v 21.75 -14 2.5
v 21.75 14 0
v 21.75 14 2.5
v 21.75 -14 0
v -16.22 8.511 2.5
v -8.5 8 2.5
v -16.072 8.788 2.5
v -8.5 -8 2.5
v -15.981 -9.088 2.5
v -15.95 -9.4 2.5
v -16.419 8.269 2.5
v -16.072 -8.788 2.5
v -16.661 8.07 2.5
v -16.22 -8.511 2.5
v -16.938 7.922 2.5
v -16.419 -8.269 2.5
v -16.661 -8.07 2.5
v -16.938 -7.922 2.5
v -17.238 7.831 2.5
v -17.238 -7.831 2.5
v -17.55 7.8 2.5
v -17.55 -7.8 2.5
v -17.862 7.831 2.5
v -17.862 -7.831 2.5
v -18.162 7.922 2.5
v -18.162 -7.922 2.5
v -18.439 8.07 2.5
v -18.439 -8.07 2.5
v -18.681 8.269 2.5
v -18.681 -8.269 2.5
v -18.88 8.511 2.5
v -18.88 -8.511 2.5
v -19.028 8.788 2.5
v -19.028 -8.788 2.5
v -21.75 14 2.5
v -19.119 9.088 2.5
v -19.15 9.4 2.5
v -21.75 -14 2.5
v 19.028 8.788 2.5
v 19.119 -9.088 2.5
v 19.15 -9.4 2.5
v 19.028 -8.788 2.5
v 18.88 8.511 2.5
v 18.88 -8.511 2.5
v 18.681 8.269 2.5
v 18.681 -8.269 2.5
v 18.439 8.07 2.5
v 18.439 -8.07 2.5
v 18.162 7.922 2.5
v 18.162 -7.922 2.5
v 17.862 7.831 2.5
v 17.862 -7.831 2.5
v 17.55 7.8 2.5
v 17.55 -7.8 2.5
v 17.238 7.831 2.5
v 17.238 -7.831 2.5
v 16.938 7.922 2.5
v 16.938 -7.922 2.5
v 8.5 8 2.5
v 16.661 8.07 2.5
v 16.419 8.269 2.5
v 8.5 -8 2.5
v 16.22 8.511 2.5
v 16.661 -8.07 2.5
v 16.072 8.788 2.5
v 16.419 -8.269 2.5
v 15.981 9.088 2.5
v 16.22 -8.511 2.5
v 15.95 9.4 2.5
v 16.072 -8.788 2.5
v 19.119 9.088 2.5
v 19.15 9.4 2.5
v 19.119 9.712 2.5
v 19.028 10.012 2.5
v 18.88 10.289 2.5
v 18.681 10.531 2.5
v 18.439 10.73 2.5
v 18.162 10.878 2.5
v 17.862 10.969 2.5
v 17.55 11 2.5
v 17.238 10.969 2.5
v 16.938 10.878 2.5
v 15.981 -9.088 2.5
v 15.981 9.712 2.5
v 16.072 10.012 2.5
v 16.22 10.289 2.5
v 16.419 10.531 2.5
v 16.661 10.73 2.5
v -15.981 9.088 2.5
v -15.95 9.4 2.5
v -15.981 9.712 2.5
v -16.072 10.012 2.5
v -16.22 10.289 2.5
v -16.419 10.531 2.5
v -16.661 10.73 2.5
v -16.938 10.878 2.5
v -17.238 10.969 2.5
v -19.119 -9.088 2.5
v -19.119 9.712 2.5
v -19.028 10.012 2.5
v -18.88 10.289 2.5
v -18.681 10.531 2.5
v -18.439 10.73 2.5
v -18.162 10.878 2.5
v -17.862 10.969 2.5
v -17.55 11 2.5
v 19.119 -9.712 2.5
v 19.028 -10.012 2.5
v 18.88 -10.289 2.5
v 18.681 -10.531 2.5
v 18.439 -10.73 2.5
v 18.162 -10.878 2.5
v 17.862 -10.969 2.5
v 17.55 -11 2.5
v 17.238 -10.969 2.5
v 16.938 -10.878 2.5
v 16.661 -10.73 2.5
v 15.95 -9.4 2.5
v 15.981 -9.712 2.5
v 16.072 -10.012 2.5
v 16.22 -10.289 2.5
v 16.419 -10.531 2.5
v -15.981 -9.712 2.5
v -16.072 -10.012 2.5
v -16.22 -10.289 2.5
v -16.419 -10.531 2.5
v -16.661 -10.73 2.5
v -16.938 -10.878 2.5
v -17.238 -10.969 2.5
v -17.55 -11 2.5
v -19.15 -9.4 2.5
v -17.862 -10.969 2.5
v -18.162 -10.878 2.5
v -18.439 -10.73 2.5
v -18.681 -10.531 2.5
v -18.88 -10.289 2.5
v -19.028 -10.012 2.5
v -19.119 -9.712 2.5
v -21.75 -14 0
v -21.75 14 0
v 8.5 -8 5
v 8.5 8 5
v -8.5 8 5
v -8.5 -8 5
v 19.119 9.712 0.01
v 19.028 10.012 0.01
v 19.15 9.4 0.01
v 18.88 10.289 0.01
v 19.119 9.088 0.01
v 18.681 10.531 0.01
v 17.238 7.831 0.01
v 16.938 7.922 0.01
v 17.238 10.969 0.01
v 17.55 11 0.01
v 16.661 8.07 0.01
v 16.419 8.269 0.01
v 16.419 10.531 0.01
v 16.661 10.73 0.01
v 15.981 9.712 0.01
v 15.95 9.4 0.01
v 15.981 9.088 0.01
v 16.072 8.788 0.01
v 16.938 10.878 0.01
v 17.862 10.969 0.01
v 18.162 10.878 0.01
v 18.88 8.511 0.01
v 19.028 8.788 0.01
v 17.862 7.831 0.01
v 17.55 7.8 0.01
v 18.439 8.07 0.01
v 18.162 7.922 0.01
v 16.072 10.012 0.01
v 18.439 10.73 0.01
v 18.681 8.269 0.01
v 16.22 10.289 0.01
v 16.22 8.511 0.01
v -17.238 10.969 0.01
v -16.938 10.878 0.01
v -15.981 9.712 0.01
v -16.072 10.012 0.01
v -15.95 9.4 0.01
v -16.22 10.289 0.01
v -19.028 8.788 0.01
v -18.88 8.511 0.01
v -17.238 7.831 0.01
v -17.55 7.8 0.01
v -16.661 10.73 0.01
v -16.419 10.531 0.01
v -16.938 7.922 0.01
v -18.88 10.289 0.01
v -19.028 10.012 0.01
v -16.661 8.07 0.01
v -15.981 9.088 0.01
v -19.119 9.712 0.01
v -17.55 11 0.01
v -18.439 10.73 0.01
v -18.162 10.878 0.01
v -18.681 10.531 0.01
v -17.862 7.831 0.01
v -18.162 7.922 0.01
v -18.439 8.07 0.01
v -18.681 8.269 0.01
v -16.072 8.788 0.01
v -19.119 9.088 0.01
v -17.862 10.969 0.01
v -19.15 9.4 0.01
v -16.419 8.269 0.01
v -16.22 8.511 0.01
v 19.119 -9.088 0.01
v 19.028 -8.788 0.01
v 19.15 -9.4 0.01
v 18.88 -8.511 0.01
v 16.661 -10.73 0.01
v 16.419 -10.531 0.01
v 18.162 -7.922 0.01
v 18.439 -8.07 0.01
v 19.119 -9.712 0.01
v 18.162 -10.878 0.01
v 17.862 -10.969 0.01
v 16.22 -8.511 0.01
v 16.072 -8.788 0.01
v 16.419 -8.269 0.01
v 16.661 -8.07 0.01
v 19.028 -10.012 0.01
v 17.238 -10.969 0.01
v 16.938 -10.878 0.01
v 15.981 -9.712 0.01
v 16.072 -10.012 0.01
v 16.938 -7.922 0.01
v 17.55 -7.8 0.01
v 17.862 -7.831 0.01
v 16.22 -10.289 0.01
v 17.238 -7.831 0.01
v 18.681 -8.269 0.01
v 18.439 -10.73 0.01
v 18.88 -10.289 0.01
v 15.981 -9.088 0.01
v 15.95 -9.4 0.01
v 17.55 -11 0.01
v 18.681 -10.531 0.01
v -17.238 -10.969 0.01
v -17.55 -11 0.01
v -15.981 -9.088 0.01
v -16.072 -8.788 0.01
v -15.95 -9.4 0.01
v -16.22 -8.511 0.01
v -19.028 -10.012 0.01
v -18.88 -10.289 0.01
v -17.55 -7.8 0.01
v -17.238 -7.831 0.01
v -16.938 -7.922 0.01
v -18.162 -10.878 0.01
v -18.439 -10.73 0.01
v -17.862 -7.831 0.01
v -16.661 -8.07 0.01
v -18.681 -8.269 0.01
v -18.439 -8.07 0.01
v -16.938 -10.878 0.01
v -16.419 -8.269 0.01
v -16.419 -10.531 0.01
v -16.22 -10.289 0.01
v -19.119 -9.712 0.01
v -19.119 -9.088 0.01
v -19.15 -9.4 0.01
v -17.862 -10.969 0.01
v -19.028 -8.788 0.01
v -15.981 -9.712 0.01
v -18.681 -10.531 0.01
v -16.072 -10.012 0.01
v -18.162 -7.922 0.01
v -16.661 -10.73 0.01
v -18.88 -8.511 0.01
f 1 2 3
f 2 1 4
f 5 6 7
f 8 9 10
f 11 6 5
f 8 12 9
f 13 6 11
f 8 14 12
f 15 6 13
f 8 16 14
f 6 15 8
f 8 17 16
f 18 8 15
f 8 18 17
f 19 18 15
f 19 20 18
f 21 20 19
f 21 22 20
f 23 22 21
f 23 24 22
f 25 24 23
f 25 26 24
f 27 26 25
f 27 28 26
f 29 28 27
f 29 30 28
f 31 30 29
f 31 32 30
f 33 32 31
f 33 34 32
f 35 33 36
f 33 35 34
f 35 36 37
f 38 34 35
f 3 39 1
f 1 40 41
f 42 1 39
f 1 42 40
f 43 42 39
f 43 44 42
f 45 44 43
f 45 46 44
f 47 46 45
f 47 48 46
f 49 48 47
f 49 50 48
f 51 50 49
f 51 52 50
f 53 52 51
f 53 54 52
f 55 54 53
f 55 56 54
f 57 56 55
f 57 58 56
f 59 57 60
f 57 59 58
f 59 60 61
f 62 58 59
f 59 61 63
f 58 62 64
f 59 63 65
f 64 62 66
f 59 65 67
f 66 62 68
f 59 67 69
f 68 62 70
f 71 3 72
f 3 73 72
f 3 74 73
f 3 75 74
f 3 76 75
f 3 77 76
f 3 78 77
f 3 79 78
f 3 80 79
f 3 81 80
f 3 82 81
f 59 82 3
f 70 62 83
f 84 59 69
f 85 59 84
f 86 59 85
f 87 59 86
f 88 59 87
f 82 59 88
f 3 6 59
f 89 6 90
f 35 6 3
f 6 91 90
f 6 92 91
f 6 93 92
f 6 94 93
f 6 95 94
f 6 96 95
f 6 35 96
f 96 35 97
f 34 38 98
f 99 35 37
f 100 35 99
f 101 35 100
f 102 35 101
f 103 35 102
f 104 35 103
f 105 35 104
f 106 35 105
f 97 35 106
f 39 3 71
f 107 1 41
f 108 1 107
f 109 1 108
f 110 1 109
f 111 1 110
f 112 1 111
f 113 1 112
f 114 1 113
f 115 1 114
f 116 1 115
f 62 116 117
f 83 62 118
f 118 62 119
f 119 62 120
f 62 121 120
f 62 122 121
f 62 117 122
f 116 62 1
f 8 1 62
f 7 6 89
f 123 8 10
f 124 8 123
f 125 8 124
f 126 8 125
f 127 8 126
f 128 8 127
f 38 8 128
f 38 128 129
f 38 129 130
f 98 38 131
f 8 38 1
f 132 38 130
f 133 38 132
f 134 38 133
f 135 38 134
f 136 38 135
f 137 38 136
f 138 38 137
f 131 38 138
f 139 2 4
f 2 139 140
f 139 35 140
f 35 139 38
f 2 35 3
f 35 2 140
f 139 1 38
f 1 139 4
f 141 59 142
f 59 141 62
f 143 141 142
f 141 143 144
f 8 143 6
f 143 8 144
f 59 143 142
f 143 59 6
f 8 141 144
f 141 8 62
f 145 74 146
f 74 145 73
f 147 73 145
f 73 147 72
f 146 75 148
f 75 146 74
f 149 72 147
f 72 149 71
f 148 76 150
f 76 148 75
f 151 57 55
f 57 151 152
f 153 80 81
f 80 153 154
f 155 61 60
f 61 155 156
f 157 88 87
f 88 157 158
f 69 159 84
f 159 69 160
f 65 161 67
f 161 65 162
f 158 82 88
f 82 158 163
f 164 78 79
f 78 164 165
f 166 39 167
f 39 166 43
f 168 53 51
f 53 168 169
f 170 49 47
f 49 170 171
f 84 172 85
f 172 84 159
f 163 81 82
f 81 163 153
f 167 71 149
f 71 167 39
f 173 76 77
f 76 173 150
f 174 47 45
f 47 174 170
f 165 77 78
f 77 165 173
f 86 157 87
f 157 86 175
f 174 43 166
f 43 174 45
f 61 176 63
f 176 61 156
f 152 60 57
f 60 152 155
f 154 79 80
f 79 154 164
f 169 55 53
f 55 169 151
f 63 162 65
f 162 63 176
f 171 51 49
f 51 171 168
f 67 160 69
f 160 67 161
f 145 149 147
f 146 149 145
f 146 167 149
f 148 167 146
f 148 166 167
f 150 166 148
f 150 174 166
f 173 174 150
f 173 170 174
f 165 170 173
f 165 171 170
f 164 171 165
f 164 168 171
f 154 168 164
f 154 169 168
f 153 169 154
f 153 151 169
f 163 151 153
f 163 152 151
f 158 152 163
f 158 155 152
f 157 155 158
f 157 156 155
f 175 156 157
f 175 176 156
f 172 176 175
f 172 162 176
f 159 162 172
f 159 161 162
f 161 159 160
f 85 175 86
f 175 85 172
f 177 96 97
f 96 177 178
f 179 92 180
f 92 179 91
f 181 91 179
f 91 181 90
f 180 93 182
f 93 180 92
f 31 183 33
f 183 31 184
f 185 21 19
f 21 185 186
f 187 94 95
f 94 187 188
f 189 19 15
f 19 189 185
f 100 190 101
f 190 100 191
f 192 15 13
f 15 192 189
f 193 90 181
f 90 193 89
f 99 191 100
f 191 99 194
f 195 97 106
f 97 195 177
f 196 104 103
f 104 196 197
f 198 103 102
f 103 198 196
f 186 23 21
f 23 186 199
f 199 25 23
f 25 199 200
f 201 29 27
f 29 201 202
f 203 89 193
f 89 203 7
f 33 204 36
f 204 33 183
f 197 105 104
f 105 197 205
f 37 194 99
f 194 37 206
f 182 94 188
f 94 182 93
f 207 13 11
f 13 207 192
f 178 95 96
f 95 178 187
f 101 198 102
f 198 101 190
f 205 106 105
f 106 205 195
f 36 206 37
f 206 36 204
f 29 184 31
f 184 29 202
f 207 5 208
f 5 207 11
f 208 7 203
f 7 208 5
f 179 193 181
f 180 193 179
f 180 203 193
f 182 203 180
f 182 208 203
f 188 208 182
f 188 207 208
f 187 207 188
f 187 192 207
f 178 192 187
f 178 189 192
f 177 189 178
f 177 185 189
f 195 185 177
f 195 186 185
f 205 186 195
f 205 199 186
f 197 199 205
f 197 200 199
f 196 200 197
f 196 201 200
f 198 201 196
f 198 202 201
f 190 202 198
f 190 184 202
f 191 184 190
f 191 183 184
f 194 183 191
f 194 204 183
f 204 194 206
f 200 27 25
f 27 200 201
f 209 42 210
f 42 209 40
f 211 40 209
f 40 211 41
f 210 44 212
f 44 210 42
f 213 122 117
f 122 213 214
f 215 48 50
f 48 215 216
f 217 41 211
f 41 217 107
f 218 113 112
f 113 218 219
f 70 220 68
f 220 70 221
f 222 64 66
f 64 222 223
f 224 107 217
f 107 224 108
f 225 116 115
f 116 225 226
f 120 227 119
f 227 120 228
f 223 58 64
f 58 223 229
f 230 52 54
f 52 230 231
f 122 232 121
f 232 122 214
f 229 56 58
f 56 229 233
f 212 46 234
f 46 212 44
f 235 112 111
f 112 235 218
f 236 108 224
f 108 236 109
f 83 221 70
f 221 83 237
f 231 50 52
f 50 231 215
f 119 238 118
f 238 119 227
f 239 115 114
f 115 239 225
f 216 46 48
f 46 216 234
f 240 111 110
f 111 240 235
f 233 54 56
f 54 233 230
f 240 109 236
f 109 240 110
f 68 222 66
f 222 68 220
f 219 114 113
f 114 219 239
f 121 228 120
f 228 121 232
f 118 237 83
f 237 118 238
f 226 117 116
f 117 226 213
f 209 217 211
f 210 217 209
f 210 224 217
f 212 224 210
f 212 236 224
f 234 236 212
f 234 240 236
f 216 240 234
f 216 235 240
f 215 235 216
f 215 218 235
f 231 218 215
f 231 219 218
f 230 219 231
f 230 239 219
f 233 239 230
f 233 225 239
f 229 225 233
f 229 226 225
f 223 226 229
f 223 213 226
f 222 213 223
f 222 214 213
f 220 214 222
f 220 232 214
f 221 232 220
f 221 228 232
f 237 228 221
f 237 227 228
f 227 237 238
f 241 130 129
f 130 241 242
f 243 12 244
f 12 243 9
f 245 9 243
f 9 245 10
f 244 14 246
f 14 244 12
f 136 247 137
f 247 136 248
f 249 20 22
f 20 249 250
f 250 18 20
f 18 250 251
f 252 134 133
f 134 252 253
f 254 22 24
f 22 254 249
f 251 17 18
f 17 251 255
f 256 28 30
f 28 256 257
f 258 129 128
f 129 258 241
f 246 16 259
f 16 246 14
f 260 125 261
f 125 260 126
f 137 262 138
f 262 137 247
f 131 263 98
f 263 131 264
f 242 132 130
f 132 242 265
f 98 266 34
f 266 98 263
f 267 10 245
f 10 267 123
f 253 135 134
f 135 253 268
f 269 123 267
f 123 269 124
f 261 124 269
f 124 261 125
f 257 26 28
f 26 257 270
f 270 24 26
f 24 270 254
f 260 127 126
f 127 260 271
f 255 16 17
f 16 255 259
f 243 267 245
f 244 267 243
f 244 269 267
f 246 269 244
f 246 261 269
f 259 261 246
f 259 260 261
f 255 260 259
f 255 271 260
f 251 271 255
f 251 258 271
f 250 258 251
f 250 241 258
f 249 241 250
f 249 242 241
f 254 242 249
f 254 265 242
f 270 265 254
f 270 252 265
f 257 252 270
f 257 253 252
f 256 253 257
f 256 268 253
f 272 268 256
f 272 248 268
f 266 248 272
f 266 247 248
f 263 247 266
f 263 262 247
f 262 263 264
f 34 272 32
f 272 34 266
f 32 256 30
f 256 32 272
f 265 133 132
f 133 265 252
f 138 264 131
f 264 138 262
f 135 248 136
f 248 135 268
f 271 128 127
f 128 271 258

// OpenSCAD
module muRataDevBoadHoles(d=3.2, h=10)
{
    x=35.1;
    y=18.8;
    translate([0,0,.01]) color("red")
    {
        translate([x/2,y/2,h/2])
            cylinder(h,d=d, center=true, $fn=32);
        translate([-x/2,y/2,h/2])
            cylinder(h,d=d, center=true, $fn=32);
         translate([x/2,-y/2,h/2])
            cylinder(h,d=d, center=true, $fn=32);   
        translate([-x/2,-y/2,h/2])
            cylinder(h,d=d, center=true, $fn=32);
    }
}

module muRataDevBoardPCBOutline()
{
    union()
    {
        translate([0,0,2.5/2])
            cube([43.5, 28, 2.5],true );
        translate([0,0,5/2])
            cube ([17, 16, 5], true);
    }
}
module muRataDevBoard()
{
    
    difference()
    {
        muRataDevBoardPCBOutline();
        muRataDevBoadHoles();
    }
        
}

muRataDevBoard();

//muRataDevBoadHoles();
